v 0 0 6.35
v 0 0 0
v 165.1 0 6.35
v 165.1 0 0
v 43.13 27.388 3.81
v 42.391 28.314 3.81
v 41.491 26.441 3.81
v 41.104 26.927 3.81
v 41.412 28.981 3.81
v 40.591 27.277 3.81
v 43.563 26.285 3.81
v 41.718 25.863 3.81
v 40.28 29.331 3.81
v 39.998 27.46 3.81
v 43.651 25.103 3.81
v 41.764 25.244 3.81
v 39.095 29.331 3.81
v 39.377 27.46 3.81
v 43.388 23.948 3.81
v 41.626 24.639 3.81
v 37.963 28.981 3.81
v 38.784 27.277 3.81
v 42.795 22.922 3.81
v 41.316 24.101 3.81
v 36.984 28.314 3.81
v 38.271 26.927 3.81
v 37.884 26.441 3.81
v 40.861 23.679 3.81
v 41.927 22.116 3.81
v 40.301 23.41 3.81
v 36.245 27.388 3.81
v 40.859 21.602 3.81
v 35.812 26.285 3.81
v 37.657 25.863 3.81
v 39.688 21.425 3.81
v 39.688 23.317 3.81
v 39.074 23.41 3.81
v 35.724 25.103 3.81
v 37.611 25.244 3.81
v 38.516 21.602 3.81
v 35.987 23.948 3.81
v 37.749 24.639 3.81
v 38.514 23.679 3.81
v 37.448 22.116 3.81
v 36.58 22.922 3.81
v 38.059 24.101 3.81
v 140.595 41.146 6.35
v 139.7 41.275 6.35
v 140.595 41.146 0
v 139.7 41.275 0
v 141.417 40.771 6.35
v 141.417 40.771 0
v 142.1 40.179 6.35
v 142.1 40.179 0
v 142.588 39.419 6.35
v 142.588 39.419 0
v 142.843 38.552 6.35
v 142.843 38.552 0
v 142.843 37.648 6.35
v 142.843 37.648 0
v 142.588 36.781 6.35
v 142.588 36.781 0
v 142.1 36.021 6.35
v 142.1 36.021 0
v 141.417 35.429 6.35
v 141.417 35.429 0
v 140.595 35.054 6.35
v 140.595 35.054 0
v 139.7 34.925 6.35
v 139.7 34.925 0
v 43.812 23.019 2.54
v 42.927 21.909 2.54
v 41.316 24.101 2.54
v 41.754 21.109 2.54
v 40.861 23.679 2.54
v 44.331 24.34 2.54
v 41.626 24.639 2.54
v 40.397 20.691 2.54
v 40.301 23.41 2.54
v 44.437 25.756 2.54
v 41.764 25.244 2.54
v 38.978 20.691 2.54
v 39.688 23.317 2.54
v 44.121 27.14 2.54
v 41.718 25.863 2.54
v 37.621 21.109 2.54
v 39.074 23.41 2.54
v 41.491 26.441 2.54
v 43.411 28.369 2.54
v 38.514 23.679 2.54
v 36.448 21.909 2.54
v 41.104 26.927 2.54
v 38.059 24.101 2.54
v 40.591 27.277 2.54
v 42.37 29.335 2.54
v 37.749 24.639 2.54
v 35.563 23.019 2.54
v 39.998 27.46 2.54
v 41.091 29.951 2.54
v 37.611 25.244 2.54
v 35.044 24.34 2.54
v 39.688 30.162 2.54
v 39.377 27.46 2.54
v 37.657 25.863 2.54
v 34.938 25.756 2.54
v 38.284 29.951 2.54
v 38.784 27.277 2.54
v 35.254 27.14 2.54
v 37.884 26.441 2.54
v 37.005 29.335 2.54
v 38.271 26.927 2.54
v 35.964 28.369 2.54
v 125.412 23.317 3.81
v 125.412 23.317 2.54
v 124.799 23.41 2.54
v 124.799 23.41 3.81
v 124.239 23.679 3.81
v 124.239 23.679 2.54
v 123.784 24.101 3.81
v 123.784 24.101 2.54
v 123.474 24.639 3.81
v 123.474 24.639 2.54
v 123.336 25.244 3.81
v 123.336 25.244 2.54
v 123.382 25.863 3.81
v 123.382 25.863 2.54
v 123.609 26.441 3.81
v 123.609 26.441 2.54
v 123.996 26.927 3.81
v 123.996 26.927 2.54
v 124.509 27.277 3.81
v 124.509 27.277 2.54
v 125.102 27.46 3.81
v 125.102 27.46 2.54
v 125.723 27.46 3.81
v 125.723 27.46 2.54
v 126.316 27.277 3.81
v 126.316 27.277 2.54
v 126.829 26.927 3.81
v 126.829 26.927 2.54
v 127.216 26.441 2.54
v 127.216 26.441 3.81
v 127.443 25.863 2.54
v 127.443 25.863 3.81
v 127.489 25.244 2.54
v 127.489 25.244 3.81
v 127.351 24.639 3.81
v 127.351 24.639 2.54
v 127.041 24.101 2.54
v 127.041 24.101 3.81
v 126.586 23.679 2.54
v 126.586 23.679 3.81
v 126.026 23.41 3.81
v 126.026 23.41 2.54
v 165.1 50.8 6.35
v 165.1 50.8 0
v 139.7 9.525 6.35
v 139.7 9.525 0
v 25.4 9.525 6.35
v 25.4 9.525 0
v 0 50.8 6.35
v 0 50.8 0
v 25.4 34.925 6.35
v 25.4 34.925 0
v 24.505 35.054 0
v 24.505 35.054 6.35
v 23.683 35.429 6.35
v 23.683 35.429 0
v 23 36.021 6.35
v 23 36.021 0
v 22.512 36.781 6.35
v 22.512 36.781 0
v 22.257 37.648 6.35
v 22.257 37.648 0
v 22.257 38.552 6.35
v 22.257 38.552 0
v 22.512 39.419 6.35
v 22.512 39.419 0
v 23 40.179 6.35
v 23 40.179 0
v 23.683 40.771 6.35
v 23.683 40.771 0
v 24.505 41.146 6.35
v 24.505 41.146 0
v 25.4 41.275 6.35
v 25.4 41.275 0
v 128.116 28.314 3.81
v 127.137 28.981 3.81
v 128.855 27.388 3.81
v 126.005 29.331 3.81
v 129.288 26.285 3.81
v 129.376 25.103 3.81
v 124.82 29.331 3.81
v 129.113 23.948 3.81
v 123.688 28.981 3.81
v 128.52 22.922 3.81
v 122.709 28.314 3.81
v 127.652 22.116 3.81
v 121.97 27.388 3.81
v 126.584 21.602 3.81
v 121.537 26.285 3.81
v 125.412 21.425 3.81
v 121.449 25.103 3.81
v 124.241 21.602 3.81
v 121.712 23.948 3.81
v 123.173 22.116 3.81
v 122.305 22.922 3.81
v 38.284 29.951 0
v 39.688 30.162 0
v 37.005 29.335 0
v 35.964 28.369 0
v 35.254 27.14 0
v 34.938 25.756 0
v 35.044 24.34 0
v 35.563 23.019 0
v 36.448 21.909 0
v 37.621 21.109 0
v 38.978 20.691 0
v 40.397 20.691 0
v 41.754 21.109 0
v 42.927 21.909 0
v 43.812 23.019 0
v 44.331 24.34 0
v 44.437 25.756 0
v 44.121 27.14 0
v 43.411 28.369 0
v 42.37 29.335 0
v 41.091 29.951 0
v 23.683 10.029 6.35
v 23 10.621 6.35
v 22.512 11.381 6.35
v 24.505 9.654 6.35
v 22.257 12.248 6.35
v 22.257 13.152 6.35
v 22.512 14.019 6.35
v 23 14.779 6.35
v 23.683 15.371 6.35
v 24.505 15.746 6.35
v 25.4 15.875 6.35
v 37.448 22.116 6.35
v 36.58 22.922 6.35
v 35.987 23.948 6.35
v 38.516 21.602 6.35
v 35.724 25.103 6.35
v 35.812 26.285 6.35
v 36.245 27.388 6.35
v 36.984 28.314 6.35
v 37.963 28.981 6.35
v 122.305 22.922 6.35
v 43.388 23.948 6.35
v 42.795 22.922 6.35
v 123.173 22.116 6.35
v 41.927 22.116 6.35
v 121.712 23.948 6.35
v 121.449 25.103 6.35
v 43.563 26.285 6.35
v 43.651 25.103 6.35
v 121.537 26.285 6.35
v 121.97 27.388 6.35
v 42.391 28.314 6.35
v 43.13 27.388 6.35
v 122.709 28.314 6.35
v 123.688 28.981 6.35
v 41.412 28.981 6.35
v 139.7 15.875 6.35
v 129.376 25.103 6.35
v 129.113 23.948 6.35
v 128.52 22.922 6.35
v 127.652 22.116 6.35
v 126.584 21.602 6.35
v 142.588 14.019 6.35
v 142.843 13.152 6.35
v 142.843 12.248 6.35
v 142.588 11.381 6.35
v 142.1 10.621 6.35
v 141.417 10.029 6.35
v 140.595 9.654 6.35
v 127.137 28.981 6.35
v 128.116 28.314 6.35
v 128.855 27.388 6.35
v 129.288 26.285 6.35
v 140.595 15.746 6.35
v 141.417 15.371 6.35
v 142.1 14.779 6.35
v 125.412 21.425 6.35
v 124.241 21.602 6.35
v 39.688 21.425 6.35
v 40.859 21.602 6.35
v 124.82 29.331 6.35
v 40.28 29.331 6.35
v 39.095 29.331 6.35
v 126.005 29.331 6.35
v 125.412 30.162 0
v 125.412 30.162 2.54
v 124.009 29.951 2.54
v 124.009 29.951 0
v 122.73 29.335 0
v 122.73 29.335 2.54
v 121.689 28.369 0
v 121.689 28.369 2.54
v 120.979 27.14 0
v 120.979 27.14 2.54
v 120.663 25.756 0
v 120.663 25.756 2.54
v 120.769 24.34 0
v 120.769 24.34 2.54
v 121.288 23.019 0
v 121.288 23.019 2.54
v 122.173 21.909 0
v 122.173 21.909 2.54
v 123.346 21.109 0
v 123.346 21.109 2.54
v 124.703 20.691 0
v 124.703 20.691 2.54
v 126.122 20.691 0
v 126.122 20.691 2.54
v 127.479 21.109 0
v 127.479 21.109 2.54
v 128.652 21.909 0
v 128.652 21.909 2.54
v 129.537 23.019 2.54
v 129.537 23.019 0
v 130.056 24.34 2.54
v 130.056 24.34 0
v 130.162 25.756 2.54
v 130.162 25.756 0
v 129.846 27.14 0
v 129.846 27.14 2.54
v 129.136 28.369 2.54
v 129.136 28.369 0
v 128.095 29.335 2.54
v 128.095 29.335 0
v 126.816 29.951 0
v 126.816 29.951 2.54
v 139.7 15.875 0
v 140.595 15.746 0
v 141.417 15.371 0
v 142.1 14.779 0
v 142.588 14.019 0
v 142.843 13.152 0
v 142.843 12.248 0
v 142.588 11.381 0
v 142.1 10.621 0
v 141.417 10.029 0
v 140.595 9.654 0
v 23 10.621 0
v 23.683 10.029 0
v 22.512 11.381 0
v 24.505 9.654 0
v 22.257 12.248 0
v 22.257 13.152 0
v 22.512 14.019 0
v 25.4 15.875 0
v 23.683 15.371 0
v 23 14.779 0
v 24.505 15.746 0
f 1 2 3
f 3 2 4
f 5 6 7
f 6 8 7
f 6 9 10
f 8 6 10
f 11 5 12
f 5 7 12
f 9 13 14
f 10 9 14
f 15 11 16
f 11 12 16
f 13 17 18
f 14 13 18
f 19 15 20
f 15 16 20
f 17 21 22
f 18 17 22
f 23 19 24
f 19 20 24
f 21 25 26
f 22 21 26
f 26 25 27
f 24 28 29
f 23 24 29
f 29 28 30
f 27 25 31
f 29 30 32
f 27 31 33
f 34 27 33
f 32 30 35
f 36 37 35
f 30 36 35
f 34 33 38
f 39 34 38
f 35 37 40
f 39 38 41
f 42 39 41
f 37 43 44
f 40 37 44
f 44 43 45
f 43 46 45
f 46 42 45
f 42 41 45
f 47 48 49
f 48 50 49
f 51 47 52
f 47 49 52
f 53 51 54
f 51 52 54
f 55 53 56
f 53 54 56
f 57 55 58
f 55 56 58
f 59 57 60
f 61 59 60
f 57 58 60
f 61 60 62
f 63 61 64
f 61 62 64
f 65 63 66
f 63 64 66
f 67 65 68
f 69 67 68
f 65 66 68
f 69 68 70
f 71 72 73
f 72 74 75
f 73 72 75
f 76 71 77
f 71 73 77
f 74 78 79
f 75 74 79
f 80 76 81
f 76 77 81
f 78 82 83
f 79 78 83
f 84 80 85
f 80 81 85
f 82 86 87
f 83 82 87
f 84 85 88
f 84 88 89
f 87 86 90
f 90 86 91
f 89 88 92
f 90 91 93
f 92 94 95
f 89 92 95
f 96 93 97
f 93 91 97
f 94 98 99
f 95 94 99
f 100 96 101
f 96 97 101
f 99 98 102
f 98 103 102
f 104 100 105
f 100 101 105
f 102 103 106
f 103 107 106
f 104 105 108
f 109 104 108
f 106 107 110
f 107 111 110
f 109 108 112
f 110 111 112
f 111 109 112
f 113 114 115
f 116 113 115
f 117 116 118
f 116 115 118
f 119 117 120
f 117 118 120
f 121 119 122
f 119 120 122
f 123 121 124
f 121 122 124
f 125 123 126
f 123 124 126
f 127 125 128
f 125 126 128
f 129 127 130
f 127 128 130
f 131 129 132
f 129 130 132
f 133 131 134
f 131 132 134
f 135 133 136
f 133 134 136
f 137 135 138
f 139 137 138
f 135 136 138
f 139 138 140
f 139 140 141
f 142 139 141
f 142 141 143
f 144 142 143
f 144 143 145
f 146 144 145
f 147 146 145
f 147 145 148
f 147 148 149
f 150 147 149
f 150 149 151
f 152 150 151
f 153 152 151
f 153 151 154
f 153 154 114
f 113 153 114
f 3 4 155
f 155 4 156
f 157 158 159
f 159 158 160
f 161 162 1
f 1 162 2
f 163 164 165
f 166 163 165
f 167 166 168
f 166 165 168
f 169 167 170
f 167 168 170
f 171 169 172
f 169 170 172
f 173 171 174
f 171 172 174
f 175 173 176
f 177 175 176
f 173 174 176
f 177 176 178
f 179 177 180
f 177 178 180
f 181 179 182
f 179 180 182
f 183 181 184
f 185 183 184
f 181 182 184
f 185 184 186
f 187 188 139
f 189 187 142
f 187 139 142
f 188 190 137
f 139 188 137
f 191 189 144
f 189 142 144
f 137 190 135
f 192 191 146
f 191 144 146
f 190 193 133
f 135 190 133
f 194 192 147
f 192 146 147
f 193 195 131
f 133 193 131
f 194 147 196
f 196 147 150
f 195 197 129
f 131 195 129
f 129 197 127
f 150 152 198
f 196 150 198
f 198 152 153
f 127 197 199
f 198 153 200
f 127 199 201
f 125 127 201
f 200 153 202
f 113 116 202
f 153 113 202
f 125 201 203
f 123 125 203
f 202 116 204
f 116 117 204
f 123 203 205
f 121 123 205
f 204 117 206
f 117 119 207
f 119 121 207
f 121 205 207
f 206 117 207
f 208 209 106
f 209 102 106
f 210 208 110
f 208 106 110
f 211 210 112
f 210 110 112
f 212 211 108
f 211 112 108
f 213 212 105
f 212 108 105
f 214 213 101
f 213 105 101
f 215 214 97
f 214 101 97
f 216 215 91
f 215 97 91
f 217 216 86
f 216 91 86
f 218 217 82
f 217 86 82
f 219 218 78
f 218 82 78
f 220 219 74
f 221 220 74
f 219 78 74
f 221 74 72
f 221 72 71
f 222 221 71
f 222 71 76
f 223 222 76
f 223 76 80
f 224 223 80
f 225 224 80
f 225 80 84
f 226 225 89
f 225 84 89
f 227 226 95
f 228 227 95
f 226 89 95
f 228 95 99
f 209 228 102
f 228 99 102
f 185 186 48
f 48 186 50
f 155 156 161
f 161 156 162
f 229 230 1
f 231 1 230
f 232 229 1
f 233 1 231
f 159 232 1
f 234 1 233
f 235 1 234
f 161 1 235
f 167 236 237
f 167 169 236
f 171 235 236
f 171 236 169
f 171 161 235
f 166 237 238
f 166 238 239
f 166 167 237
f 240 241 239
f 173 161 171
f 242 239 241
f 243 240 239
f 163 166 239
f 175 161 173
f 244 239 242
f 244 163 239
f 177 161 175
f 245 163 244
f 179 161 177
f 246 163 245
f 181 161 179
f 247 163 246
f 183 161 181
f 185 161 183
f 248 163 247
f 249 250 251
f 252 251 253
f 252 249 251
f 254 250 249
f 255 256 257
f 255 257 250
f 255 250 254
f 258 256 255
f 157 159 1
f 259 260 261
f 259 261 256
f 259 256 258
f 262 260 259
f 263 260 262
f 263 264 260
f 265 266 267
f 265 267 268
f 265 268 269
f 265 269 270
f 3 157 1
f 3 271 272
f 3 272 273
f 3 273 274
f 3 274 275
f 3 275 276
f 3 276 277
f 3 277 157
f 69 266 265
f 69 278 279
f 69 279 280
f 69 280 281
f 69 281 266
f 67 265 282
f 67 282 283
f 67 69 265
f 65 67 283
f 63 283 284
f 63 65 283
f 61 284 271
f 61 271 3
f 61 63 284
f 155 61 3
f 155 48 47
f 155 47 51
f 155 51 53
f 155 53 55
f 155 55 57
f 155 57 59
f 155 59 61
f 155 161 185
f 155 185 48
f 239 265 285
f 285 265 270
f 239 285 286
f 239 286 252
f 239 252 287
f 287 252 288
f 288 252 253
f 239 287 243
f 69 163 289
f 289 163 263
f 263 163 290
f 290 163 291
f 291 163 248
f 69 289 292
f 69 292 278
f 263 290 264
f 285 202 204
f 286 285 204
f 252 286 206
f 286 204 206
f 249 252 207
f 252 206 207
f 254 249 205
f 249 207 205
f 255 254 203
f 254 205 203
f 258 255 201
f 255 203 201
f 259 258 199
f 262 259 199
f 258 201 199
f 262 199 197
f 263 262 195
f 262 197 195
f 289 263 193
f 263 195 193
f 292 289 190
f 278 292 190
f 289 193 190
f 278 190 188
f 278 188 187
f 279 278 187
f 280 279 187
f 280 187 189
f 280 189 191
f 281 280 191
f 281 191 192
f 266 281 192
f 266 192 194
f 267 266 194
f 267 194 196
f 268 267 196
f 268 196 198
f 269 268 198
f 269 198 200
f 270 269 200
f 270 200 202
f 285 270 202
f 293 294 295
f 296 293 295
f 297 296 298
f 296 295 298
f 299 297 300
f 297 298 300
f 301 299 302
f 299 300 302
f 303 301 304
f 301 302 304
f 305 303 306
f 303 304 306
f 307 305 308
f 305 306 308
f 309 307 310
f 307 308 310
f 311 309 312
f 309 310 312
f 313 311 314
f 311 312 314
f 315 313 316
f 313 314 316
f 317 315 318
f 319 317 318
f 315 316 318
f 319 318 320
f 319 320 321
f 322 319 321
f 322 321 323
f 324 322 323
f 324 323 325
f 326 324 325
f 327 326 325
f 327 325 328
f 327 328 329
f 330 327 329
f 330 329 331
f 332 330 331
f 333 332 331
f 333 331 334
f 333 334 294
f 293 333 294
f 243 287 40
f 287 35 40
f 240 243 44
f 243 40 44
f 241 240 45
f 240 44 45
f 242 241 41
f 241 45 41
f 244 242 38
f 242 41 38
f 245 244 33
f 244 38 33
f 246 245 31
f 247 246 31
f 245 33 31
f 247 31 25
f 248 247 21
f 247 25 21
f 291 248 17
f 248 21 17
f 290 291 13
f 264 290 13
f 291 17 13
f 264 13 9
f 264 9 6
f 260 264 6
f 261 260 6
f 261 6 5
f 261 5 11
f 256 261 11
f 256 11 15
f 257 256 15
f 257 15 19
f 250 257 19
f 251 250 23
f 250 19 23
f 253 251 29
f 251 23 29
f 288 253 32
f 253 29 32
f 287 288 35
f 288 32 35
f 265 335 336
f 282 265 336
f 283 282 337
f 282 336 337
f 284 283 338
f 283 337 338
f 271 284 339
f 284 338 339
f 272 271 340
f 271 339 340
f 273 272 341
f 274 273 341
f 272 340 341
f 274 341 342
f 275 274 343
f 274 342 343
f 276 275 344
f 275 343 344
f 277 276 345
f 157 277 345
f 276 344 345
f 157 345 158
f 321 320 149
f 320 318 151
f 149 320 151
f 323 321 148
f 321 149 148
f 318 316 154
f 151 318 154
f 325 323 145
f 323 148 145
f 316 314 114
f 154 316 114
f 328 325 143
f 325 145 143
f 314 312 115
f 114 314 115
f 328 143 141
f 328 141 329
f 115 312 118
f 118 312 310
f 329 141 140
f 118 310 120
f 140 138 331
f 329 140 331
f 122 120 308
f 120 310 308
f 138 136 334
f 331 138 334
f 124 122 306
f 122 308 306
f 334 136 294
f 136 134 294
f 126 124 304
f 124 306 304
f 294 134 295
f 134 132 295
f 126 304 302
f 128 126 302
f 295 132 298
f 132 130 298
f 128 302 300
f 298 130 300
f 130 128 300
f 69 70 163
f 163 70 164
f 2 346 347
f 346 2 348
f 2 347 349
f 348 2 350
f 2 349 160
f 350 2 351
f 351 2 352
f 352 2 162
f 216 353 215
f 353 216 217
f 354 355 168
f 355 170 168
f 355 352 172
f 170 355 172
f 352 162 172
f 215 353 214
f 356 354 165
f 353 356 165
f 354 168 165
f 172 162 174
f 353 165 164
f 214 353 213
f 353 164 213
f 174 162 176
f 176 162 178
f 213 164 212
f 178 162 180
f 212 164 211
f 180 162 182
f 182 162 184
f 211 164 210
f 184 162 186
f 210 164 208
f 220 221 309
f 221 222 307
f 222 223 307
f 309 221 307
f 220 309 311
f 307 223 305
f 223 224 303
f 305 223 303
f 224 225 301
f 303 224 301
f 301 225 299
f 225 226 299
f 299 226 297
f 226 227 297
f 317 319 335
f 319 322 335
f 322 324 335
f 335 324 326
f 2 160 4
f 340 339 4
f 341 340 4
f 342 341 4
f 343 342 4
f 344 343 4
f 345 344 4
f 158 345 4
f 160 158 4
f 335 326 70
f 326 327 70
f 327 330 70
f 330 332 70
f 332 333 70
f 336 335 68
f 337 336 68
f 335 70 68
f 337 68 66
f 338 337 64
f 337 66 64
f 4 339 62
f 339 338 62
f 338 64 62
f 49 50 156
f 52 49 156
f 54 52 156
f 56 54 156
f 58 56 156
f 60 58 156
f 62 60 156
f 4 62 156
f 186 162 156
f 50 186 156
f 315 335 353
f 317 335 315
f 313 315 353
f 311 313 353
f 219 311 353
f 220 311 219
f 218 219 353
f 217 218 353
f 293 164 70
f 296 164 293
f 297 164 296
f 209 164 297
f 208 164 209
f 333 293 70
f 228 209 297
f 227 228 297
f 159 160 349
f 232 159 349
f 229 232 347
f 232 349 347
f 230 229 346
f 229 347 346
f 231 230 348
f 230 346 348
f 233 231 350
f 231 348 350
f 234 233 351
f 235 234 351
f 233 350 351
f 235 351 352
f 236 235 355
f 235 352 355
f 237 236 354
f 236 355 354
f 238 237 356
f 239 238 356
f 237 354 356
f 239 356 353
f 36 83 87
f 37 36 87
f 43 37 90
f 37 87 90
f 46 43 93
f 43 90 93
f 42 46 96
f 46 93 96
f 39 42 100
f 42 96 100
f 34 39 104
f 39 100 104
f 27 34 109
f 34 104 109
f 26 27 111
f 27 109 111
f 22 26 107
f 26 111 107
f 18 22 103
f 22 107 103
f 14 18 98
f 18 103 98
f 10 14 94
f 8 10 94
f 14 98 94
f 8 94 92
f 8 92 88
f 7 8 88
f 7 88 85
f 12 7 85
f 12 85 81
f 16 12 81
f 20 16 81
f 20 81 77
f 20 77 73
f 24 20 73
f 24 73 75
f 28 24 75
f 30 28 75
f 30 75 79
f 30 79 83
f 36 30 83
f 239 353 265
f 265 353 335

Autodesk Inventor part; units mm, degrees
ref_plane "YZ Plane" through (0, 0, 0) normal (1, 0, 0) x (0, 1, 0)
ref_plane "XZ Plane" through (0, 0, 0) normal (0, 1, 0) x (-1, 0, 0)
ref_plane "XY Plane" through (0, 0, 0) normal (0, 0, 1) x (1, 0, 0)
sketch "Sketch1" plane through (0, 0, 0) normal (0, 0, 1) x (1, 0, 0)
  line L0 (0, 0) -> (165.1, 0)
  line L1 (165.1, 0) -> (165.1, 50.8)
  line L2 (165.1, 50.8) -> (0, 50.8)
  line L3 (0, 50.8) -> (0, 0)
  dimension "d0" = 165.1
  dimension "d1" = 50.8
extrude "Extrusion1" add sketch "Sketch1" along normal blind 6.35
sketch "Sketch3" plane through (0, 0, 6.35) normal (0, 0, 1) x (1, 0, 0)
  line L0 (39.6875, 25.4) -> (125.4125, 25.4)
  line L1 (0, 0) -> (165.1, 0) projected
  line L2 (0, 50.8) -> (0, 0) projected
  line L3 (165.1, 50.8) -> (0, 50.8) projected
  line L4 (82.55, 50.8) -> (82.55, 0)
  line L5 (165.1, 0) -> (165.1, 50.8) projected
  dimension "d14" = 85.725
  dimension "d15" = 25.4
  dimension "d16" = 39.6875
  dimension "d33" = 165.1
  dimension "d34" = 39.6875
hole "Hole1" at (39.6875, 25.4, 6.35) at (125.4125, 25.4, 6.35) direction (0, 0, -1) diameter 4.1656 depth 6.35 tip angle 118 counterbore diameter 7.9502 counterbore depth 2.54
sketch "Sketch4" plane through (0, 0, 0) normal (0, 0, -1) x (-1, 0, 0)
  line L0 (-139.7, 12.7) -> (-25.4, 12.7) construction
  line L1 (-139.7, 9.525) -> (-25.4, 9.525)
  line L2 (-25.4, 15.875) -> (-139.7, 15.875)
  arc A0 (-139.7, 15.875) -> (-139.7, 9.525) centre (-139.7, 12.7) ccw
  arc A1 (-25.4, 9.525) -> (-25.4, 15.875) centre (-25.4, 12.7) ccw
  line L3 (0, 50.8) -> (0, 0) projected
  line L4 (-139.7, 38.1) -> (-25.4, 38.1) construction
  line L5 (-139.7, 34.925) -> (-25.4, 34.925)
  line L6 (-25.4, 41.275) -> (-139.7, 41.275)
  arc A2 (-139.7, 41.275) -> (-139.7, 34.925) centre (-139.7, 38.1) ccw
  arc A3 (-25.4, 34.925) -> (-25.4, 41.275) centre (-25.4, 38.1) ccw
  line L7 (-165.1, 50.8) -> (0, 50.8) projected
  point P0 (-82.55, 12.7)
  point P1 (-82.55, 38.1)
  dimension "d24" = 6.35
  dimension "d25" = 25.4
  dimension "d26" = 114.3
  dimension "d27" = 6.35
  dimension "d28" = 25.4
  dimension "d29" = 12.7
  dimension "d32" = 114.3
extrude "Extrusion3" cut sketch "Sketch4" against normal blind 6.35
sketch "Sketch5" plane through (0, 0, 0) normal (0, 0, -1) x (-1, 0, 0)
  circle A0 centre (-39.6875, 25.4) radius 2.0828 projected
  circle A1 centre (-125.4125, 25.4) radius 2.0828 projected
  point P0 (0, 0)
hole "Hole2" at (39.6875, 25.4, 0) at (125.4125, 25.4, 0) direction (0, 0, 1) diameter 9.525 depth 2.54
properties part number "ps bottom"
